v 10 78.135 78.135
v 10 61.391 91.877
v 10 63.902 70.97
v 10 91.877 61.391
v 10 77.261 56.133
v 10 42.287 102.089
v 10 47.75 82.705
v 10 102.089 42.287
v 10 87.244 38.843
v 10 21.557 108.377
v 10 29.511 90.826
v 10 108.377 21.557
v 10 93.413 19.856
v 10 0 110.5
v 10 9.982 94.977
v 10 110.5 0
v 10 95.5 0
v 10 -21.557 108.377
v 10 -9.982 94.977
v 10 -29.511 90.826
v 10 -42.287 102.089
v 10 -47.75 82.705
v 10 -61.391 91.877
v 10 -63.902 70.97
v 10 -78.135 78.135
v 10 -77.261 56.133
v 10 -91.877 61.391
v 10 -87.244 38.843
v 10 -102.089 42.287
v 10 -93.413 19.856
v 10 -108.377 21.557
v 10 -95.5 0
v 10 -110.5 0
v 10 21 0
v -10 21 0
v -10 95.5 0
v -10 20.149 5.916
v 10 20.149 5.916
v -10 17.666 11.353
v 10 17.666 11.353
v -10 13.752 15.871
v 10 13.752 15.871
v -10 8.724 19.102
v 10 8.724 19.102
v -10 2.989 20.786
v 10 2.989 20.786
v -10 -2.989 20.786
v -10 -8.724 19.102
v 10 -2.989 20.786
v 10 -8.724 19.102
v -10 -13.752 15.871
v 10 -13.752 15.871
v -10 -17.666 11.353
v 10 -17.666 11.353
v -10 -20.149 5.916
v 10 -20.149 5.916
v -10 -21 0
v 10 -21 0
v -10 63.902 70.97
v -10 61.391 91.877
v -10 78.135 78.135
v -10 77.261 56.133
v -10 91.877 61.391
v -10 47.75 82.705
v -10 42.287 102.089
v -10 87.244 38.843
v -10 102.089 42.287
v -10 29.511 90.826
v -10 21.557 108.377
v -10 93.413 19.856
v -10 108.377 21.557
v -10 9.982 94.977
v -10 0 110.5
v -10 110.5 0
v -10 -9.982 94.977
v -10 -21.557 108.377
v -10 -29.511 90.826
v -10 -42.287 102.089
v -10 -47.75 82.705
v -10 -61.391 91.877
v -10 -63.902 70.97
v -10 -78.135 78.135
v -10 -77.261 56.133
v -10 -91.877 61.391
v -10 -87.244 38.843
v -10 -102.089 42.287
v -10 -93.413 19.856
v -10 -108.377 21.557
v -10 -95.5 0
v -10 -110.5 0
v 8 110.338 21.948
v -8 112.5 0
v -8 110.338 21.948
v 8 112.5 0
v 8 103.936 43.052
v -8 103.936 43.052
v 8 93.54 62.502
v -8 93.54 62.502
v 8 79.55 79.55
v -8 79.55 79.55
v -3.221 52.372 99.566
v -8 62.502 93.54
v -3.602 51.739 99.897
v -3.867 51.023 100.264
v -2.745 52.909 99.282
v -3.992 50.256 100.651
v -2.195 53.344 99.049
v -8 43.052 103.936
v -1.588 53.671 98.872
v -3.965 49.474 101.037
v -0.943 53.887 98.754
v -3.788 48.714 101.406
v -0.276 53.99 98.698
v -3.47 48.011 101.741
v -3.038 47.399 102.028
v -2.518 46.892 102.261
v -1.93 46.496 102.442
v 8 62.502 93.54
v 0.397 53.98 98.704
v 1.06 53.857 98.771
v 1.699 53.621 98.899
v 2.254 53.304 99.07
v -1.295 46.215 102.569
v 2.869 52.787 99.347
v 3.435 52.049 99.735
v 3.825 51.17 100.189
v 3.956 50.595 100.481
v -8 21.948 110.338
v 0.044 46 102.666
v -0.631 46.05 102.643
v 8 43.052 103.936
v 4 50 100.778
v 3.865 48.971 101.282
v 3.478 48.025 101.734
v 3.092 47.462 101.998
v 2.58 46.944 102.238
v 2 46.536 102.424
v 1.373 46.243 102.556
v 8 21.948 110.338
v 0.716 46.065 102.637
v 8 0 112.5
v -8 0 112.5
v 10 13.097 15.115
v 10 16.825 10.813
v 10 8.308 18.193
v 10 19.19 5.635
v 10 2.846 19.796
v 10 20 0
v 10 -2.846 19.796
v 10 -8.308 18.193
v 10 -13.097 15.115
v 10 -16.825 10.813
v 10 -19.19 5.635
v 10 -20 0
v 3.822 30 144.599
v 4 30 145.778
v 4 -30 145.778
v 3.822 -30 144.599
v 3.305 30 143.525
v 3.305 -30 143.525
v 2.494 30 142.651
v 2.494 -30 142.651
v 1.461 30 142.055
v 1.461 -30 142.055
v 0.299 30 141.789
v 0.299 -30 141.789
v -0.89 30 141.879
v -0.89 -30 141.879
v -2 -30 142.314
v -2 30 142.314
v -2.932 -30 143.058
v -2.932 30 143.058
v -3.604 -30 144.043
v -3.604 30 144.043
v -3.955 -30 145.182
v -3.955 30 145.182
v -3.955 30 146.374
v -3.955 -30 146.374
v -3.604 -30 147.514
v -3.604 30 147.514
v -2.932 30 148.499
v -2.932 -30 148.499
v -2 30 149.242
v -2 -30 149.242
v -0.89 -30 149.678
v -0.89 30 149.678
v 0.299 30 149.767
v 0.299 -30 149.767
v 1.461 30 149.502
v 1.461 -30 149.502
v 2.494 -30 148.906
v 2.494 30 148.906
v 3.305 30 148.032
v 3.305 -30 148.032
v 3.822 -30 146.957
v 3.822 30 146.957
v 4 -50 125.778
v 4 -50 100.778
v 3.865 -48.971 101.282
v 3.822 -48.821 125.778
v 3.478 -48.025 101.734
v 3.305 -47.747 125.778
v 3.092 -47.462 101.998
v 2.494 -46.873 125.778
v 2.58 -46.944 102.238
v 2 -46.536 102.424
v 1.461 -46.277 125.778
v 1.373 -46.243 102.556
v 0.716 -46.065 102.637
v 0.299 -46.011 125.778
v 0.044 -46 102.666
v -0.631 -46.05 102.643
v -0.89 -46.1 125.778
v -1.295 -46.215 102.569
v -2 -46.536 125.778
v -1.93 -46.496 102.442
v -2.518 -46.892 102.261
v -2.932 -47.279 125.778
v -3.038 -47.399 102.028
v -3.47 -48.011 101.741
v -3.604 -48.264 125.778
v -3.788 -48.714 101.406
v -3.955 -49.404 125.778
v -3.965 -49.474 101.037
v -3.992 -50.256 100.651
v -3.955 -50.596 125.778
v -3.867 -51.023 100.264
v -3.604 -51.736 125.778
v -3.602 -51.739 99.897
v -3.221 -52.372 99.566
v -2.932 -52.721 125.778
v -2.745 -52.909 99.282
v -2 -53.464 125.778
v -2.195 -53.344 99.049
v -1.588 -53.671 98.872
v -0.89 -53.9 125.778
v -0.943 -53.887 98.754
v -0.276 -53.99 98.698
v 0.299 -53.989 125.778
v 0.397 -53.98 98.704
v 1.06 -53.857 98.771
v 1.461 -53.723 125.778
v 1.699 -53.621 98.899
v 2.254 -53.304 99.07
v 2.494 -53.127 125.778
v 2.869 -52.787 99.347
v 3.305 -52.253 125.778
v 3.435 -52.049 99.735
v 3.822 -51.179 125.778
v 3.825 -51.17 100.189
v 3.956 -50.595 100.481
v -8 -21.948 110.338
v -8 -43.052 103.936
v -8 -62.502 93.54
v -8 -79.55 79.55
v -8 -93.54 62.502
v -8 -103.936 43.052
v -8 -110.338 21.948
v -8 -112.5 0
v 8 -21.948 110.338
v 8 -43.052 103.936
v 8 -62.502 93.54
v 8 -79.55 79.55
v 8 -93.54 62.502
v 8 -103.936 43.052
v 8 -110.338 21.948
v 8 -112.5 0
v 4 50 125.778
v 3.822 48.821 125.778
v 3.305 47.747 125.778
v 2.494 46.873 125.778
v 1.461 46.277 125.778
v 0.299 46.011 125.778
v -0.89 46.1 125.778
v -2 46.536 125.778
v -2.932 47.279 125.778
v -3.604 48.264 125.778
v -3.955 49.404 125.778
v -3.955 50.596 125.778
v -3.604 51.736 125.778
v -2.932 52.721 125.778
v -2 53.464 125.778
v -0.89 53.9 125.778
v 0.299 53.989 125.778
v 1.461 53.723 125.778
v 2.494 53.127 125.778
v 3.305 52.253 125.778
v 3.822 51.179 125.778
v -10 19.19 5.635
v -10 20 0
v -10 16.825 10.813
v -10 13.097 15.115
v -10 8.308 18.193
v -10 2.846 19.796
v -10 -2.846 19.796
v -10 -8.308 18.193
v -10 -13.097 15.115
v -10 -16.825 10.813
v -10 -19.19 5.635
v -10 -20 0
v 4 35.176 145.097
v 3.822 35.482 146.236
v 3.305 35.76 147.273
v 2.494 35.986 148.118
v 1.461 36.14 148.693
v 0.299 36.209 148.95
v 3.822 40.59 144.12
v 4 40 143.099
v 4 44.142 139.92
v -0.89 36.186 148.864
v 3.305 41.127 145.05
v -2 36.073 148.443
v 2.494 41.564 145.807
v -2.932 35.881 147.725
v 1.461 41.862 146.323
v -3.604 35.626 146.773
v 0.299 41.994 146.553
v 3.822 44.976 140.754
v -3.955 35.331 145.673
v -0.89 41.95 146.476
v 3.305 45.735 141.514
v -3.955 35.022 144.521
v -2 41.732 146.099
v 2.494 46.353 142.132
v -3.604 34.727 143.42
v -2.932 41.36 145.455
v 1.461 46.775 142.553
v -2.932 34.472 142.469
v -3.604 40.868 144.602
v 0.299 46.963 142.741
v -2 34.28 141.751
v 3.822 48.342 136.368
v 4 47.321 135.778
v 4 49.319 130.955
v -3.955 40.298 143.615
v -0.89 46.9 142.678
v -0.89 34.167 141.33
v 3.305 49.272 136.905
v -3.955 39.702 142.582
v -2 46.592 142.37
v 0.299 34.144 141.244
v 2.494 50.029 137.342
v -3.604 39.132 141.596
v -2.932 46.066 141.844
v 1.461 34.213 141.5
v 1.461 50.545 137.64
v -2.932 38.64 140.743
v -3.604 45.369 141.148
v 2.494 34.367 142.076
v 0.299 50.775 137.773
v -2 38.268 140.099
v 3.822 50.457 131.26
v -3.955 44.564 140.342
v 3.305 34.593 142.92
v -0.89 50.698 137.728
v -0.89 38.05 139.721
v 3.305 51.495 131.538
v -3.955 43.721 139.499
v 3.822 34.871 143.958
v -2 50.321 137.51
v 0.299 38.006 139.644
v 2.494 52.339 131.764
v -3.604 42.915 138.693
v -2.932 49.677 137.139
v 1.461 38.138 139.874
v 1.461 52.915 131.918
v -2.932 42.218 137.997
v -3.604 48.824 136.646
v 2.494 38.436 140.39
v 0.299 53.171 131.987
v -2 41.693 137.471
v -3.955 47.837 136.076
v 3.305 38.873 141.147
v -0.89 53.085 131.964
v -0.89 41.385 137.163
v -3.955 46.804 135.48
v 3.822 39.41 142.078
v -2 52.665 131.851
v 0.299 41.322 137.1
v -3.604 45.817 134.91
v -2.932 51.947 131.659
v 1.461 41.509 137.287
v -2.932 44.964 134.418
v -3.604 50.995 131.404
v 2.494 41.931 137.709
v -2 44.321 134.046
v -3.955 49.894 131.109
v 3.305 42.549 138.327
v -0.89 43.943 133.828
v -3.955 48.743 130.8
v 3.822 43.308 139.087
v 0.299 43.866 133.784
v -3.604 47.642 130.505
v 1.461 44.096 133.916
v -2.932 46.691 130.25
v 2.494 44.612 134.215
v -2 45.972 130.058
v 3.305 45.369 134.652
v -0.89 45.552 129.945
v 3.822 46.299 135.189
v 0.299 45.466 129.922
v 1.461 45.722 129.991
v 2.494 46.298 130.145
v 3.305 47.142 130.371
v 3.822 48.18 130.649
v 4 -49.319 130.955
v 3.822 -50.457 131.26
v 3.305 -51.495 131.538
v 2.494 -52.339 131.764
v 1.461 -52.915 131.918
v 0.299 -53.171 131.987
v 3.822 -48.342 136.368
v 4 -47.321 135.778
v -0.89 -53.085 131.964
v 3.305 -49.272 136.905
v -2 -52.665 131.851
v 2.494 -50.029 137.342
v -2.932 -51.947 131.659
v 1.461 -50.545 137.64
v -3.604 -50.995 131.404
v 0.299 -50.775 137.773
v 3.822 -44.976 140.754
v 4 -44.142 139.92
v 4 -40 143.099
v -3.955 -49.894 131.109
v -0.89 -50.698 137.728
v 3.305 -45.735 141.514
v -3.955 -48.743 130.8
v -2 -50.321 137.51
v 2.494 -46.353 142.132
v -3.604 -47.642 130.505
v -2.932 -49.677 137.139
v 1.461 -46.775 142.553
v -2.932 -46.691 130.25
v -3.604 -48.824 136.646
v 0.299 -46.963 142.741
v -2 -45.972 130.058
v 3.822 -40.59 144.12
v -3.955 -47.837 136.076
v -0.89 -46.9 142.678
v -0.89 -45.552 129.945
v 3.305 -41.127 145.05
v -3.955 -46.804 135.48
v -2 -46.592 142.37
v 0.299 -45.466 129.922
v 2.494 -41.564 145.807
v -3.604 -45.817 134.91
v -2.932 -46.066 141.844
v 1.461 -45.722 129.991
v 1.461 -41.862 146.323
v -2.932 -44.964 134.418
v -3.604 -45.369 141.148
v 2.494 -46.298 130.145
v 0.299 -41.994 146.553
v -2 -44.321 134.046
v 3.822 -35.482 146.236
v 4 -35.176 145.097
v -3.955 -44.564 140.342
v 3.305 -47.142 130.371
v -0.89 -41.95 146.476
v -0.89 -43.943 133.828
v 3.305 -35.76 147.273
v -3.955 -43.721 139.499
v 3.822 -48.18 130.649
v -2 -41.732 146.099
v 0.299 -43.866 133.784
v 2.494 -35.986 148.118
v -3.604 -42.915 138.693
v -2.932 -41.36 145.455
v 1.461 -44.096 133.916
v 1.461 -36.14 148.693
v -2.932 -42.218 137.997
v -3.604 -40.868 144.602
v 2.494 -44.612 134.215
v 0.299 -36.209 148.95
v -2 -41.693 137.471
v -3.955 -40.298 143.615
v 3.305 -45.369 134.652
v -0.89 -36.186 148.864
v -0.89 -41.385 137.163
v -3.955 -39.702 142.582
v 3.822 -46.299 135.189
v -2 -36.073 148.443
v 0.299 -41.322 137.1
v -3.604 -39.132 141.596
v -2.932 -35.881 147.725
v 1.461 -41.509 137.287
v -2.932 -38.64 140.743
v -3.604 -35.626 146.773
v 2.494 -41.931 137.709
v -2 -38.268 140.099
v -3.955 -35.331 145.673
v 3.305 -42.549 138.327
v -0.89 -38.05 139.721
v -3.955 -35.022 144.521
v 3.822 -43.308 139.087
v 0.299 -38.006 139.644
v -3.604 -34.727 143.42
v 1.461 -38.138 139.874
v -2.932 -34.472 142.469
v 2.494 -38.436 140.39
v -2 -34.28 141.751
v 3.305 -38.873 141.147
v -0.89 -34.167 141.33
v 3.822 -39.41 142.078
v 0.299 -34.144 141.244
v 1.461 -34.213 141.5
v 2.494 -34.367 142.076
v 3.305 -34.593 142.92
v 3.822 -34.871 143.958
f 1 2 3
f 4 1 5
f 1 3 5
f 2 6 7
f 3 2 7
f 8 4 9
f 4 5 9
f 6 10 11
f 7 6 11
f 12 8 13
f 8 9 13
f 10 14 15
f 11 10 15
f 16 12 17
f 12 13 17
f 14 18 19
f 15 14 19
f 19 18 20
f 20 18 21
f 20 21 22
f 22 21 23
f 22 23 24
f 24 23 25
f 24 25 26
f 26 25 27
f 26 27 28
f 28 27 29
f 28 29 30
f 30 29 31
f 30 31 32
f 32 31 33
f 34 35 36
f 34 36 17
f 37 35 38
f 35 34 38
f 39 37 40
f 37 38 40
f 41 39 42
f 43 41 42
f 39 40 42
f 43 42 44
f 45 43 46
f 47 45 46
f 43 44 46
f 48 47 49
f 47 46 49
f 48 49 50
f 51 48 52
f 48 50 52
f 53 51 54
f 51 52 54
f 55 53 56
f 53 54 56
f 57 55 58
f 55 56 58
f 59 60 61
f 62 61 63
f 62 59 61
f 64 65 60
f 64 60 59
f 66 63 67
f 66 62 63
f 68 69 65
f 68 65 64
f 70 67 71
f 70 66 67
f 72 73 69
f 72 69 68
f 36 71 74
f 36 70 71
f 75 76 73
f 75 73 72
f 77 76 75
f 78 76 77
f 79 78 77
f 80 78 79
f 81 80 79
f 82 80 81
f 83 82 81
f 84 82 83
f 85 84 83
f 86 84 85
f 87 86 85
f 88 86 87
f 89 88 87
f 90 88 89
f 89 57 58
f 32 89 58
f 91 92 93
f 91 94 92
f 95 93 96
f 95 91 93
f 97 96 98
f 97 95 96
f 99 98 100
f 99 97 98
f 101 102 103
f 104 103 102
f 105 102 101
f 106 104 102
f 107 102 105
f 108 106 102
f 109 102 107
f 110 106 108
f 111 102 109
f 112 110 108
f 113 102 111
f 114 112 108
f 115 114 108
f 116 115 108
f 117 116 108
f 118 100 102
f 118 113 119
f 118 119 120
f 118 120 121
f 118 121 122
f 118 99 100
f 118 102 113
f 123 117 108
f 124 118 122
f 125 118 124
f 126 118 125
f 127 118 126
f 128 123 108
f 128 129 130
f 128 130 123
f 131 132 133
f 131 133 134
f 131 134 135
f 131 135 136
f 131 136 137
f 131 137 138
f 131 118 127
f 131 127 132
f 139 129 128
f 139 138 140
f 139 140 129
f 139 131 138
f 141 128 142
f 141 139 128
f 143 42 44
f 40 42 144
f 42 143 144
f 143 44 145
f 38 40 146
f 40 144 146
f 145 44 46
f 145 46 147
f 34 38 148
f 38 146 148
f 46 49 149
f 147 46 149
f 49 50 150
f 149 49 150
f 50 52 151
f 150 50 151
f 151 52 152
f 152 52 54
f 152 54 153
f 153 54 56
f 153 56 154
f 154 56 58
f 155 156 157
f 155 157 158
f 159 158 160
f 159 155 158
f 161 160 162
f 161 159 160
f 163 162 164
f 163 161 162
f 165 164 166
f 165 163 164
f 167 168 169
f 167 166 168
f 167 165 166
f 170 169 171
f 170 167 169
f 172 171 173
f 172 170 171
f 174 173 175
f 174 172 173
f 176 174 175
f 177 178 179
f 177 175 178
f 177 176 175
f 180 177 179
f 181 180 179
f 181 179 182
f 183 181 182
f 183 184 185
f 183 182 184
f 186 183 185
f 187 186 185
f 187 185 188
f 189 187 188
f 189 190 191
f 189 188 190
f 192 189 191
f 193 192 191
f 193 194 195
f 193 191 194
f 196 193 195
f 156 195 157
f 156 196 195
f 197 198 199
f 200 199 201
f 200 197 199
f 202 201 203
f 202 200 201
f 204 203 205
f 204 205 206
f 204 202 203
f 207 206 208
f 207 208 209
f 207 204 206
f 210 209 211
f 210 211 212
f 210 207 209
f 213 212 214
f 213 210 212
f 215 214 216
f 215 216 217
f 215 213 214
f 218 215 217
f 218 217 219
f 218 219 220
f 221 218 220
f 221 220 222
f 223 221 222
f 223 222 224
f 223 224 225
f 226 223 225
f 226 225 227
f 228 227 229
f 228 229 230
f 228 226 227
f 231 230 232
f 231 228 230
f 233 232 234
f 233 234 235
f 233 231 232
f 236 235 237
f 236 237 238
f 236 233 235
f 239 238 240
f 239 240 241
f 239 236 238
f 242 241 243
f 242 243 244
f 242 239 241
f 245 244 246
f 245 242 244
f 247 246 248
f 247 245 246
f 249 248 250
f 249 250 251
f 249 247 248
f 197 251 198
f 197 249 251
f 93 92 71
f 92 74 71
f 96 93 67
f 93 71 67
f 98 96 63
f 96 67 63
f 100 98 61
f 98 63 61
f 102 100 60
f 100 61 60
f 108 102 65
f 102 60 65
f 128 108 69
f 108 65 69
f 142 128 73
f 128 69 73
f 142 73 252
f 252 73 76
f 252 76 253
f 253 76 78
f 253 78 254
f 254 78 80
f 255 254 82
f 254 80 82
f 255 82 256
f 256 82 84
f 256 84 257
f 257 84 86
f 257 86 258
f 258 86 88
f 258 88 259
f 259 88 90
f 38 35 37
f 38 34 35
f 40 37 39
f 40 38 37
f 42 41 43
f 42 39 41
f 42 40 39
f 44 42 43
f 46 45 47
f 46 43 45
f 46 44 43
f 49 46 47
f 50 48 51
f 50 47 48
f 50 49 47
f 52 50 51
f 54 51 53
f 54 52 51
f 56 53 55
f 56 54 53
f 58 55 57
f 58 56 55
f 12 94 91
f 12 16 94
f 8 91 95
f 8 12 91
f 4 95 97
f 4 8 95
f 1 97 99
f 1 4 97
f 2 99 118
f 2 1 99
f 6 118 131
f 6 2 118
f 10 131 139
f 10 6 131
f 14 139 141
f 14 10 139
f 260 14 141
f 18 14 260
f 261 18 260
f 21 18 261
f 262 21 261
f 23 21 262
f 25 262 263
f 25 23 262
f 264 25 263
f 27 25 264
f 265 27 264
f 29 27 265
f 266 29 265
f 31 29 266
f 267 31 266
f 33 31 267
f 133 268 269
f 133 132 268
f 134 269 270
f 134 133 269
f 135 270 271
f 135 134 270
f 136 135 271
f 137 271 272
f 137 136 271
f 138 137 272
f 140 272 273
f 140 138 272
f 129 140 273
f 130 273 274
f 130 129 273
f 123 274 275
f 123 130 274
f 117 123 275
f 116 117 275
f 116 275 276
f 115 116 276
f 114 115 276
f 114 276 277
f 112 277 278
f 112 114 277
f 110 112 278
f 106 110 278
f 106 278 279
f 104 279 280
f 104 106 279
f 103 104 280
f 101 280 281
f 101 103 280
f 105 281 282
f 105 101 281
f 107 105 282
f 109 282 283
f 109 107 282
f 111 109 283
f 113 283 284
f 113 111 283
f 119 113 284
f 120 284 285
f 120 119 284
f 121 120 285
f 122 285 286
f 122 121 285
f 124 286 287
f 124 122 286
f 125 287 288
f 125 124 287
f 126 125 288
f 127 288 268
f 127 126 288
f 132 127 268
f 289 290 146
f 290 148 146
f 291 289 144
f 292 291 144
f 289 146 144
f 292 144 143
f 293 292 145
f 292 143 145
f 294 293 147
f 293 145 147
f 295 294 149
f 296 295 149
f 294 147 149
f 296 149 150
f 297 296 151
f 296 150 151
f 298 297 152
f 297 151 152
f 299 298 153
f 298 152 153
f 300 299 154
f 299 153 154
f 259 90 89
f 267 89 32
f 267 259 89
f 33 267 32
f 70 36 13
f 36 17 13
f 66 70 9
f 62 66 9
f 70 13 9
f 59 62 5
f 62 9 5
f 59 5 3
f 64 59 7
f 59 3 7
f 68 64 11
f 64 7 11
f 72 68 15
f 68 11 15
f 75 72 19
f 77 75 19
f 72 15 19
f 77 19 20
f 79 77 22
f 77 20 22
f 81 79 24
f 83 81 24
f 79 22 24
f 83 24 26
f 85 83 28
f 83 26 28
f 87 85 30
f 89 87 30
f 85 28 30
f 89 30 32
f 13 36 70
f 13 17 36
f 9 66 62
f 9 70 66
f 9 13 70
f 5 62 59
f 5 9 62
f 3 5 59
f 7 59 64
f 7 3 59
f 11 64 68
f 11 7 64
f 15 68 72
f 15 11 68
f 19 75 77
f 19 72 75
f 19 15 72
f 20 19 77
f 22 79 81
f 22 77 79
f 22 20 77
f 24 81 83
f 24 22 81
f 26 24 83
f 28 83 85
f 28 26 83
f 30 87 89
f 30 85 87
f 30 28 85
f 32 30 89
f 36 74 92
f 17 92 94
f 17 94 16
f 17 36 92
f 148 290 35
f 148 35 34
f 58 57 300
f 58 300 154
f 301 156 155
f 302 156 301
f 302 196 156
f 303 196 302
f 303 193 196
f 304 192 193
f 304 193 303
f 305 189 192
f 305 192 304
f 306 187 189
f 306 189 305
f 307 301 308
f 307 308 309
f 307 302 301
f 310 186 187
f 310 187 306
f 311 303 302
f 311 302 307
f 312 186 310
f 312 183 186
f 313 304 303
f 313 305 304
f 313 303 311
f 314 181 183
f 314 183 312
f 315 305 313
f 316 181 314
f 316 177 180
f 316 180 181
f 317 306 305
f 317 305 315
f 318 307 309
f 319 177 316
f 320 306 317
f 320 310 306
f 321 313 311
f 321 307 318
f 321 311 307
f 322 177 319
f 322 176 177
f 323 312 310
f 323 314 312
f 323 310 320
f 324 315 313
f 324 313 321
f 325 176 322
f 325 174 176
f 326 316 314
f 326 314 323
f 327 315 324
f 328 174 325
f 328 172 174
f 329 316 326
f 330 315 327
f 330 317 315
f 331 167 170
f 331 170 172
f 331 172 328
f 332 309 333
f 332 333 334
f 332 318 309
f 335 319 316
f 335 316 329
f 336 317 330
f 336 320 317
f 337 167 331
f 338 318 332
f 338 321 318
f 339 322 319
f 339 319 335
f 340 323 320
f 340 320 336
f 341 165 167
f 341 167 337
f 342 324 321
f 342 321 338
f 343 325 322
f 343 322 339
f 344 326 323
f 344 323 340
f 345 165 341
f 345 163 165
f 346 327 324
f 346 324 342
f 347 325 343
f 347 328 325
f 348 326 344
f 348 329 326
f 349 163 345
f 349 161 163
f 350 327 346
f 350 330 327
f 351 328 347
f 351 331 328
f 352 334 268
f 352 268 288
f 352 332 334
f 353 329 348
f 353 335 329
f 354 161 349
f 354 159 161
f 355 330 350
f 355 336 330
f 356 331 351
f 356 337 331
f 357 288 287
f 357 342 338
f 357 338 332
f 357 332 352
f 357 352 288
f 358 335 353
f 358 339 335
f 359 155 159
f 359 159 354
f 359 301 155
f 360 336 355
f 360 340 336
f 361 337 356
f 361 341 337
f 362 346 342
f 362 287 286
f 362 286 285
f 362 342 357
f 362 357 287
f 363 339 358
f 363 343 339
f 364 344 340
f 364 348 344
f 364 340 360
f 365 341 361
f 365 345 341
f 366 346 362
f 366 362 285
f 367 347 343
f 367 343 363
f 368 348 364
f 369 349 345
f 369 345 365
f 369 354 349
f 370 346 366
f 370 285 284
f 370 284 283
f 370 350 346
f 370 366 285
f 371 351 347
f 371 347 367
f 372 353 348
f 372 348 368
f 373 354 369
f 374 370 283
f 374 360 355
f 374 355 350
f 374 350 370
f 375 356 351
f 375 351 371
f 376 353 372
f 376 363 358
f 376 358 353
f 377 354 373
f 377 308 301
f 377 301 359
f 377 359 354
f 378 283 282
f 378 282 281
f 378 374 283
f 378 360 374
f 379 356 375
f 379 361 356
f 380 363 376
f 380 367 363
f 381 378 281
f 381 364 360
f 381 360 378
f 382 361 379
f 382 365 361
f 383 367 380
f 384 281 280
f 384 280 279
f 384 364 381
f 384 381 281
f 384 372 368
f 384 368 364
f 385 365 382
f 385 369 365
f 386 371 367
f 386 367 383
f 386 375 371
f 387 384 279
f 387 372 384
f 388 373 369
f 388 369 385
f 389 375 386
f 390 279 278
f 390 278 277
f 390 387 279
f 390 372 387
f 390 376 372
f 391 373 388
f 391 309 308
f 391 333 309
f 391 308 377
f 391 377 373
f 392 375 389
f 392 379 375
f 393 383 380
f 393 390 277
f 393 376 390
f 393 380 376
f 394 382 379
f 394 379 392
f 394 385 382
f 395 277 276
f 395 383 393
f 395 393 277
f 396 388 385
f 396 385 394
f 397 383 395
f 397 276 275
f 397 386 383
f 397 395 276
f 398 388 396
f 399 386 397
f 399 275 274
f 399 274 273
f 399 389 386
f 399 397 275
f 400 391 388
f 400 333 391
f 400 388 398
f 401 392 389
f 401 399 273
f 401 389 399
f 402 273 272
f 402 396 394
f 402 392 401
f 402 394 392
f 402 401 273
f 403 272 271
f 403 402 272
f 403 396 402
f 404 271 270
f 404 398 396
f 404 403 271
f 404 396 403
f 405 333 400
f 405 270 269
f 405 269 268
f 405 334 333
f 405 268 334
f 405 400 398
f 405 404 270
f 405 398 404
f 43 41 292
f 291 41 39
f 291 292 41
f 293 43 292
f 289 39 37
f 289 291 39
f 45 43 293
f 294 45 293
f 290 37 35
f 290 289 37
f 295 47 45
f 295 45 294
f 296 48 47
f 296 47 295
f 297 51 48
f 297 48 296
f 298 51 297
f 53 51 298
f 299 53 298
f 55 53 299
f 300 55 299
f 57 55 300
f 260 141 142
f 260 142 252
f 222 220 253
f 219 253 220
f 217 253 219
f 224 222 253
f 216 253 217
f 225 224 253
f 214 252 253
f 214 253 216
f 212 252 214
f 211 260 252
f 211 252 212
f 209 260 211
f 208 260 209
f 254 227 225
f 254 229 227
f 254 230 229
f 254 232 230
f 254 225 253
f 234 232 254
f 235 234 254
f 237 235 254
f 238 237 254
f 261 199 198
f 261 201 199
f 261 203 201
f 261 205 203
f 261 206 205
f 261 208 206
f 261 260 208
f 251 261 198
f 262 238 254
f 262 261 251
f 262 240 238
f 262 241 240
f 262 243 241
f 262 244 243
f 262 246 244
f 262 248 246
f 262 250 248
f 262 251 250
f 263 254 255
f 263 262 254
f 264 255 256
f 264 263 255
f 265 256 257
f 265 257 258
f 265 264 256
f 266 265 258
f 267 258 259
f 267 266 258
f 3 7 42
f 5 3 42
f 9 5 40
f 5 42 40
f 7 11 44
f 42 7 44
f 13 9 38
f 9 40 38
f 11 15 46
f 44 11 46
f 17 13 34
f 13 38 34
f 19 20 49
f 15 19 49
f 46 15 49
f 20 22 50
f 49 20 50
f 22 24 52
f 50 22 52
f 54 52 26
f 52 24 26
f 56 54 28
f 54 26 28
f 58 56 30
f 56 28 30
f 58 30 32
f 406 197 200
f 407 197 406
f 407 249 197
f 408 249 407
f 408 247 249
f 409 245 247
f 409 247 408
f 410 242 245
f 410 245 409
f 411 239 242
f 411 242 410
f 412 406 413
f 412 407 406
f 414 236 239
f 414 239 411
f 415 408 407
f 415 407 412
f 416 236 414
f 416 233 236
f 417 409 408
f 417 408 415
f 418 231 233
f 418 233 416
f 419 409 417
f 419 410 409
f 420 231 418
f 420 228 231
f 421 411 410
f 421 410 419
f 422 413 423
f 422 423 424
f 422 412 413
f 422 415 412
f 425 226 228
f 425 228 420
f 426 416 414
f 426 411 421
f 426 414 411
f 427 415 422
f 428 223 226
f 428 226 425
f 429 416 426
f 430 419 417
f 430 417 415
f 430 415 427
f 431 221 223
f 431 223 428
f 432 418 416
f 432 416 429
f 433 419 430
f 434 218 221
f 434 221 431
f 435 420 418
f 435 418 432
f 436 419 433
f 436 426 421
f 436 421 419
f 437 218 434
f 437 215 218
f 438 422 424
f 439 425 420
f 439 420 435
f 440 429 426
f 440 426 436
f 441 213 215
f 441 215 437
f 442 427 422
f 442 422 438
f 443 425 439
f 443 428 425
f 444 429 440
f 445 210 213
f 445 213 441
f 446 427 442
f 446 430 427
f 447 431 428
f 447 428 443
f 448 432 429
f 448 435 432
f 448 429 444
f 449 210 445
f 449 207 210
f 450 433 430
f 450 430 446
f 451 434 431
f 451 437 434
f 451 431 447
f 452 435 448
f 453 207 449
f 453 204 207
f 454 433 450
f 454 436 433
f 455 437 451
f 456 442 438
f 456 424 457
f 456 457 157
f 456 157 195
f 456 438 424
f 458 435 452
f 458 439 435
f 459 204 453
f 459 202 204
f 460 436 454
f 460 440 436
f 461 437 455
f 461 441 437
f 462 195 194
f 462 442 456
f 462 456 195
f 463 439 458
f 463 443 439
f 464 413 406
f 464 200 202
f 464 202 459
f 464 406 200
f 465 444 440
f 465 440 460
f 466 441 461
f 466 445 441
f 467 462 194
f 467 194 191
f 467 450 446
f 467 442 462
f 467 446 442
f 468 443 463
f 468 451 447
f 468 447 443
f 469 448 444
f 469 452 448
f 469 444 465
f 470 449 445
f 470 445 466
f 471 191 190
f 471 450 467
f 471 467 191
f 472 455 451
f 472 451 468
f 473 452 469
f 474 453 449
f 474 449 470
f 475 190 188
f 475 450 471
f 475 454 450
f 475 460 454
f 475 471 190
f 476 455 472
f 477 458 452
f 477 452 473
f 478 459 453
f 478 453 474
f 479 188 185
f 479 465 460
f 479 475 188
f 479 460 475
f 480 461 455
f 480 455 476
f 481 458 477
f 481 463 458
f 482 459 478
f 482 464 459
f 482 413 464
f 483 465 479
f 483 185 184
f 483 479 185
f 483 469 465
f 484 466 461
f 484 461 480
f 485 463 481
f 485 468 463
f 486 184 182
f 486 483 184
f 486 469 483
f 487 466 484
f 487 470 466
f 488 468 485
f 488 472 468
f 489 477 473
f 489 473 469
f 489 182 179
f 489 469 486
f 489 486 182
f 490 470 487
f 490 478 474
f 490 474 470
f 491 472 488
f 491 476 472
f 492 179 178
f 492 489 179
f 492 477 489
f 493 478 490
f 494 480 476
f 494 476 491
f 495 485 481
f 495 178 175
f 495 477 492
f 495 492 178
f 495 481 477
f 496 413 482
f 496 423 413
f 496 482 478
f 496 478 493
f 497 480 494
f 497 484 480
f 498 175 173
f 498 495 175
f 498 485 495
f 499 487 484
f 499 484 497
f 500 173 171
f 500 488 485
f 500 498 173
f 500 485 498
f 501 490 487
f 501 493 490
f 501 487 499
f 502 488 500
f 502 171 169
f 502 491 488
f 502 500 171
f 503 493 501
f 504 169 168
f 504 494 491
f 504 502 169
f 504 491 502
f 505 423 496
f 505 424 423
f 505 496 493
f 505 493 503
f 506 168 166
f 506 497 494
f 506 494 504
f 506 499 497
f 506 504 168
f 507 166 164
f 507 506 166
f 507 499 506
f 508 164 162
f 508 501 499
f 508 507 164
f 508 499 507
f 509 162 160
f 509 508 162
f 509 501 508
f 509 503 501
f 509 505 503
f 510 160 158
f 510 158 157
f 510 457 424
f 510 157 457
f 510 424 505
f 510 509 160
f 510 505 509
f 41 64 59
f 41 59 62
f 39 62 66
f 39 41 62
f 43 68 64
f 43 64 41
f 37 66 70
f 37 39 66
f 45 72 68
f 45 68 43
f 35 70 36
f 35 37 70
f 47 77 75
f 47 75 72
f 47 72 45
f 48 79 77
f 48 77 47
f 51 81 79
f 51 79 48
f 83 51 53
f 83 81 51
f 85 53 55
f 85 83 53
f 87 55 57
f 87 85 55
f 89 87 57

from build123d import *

# Parameters (mm, degrees)
F0_W           = 20
F0_H           = 1
F2_W           = 20
F2_H           = 74.5
F4_W           = 20
F4_H           = 17
F8_R           = 4
F10_SIZE       = 2
F11_W          = 20
F11_H          = 115
F12_DEPTH      = 112.5010001
F12_DEPTH_BACK = 112.5010001


with BuildPart() as f1:
    # F0 (on Front) → F1 (revolve)
    with BuildSketch(Plane.XZ):
        with Locations((0, 20.5)):
            Rectangle(F0_W, F0_H)
    revolve(axis=Axis((0, 0, 0), (1, 0, 0)))


with BuildPart() as f3:
    # F2 (on Front) → F3 (revolve)
    with BuildSketch(Plane.XZ):
        with Locations((0, 58.25)):
            Rectangle(F2_W, F2_H)
    revolve(axis=Axis((0, 0, 0), (1, 0, 0)))


with BuildPart() as f5:
    # F4 (on Front) → F5 (revolve)
    with BuildSketch(Plane.XZ):
        with Locations((0, 104)):
            Rectangle(F4_W, F4_H)
    revolve(axis=Axis((0, 0, 0), (1, 0, 0)))

    # F9: sweep along a path in F6
    with BuildLine(Plane.YZ) as f9_path:
        Line((-50, 95.1643315534), (-50, 125.7782218537))
        ThreePointArc((-50, 125.7782218537), (-44.1421356237, 139.9203574775), (-30, 145.7782218537))
        Line((-30, 145.7782218537), (30, 145.7782218537))
        ThreePointArc((30, 145.7782218537), (44.1421356237, 139.9203574775), (50, 125.7782218537))
        Line((50, 125.7782218537), (50, 95.1643315534))
    # F8 (on plane+point) → F9 (sweep)
    with BuildSketch(Plane.XY.offset(95.1643315534)):
        with Locations((0, -50)):
            Circle(F8_R)
    sweep(path=f9_path.line)

    # F10
    f10_edges = [f5.edges().sort_by_distance(p)[0] for p in [
        (10, 0, -112.5),
        (-10, 0, -112.5),
    ]]
    chamfer(f10_edges, length=F10_SIZE)


with BuildPart() as f12_tool:
    # F11 (on Front) → F12 (new body, two sides)
    with BuildSketch(Plane.XZ) as f12_sk:
        with Locations((0, -57.5)):
            Rectangle(F11_W, F11_H)
    extrude(amount=F12_DEPTH)
    extrude(f12_sk.sketch, amount=-F12_DEPTH_BACK)


with BuildPart() as f1_1:
    add(f1.part)

    # F12: cut by f12_tool
    add(f12_tool.part, mode=Mode.SUBTRACT)


with BuildPart() as f3_1:
    add(f3.part)

    # F12: cut by f12_tool
    add(f12_tool.part, mode=Mode.SUBTRACT)


with BuildPart() as f5_1:
    add(f5.part)

    # F12: cut by f12_tool
    add(f12_tool.part, mode=Mode.SUBTRACT)


solid = Compound([f1_1.part, f3_1.part, f5_1.part])
